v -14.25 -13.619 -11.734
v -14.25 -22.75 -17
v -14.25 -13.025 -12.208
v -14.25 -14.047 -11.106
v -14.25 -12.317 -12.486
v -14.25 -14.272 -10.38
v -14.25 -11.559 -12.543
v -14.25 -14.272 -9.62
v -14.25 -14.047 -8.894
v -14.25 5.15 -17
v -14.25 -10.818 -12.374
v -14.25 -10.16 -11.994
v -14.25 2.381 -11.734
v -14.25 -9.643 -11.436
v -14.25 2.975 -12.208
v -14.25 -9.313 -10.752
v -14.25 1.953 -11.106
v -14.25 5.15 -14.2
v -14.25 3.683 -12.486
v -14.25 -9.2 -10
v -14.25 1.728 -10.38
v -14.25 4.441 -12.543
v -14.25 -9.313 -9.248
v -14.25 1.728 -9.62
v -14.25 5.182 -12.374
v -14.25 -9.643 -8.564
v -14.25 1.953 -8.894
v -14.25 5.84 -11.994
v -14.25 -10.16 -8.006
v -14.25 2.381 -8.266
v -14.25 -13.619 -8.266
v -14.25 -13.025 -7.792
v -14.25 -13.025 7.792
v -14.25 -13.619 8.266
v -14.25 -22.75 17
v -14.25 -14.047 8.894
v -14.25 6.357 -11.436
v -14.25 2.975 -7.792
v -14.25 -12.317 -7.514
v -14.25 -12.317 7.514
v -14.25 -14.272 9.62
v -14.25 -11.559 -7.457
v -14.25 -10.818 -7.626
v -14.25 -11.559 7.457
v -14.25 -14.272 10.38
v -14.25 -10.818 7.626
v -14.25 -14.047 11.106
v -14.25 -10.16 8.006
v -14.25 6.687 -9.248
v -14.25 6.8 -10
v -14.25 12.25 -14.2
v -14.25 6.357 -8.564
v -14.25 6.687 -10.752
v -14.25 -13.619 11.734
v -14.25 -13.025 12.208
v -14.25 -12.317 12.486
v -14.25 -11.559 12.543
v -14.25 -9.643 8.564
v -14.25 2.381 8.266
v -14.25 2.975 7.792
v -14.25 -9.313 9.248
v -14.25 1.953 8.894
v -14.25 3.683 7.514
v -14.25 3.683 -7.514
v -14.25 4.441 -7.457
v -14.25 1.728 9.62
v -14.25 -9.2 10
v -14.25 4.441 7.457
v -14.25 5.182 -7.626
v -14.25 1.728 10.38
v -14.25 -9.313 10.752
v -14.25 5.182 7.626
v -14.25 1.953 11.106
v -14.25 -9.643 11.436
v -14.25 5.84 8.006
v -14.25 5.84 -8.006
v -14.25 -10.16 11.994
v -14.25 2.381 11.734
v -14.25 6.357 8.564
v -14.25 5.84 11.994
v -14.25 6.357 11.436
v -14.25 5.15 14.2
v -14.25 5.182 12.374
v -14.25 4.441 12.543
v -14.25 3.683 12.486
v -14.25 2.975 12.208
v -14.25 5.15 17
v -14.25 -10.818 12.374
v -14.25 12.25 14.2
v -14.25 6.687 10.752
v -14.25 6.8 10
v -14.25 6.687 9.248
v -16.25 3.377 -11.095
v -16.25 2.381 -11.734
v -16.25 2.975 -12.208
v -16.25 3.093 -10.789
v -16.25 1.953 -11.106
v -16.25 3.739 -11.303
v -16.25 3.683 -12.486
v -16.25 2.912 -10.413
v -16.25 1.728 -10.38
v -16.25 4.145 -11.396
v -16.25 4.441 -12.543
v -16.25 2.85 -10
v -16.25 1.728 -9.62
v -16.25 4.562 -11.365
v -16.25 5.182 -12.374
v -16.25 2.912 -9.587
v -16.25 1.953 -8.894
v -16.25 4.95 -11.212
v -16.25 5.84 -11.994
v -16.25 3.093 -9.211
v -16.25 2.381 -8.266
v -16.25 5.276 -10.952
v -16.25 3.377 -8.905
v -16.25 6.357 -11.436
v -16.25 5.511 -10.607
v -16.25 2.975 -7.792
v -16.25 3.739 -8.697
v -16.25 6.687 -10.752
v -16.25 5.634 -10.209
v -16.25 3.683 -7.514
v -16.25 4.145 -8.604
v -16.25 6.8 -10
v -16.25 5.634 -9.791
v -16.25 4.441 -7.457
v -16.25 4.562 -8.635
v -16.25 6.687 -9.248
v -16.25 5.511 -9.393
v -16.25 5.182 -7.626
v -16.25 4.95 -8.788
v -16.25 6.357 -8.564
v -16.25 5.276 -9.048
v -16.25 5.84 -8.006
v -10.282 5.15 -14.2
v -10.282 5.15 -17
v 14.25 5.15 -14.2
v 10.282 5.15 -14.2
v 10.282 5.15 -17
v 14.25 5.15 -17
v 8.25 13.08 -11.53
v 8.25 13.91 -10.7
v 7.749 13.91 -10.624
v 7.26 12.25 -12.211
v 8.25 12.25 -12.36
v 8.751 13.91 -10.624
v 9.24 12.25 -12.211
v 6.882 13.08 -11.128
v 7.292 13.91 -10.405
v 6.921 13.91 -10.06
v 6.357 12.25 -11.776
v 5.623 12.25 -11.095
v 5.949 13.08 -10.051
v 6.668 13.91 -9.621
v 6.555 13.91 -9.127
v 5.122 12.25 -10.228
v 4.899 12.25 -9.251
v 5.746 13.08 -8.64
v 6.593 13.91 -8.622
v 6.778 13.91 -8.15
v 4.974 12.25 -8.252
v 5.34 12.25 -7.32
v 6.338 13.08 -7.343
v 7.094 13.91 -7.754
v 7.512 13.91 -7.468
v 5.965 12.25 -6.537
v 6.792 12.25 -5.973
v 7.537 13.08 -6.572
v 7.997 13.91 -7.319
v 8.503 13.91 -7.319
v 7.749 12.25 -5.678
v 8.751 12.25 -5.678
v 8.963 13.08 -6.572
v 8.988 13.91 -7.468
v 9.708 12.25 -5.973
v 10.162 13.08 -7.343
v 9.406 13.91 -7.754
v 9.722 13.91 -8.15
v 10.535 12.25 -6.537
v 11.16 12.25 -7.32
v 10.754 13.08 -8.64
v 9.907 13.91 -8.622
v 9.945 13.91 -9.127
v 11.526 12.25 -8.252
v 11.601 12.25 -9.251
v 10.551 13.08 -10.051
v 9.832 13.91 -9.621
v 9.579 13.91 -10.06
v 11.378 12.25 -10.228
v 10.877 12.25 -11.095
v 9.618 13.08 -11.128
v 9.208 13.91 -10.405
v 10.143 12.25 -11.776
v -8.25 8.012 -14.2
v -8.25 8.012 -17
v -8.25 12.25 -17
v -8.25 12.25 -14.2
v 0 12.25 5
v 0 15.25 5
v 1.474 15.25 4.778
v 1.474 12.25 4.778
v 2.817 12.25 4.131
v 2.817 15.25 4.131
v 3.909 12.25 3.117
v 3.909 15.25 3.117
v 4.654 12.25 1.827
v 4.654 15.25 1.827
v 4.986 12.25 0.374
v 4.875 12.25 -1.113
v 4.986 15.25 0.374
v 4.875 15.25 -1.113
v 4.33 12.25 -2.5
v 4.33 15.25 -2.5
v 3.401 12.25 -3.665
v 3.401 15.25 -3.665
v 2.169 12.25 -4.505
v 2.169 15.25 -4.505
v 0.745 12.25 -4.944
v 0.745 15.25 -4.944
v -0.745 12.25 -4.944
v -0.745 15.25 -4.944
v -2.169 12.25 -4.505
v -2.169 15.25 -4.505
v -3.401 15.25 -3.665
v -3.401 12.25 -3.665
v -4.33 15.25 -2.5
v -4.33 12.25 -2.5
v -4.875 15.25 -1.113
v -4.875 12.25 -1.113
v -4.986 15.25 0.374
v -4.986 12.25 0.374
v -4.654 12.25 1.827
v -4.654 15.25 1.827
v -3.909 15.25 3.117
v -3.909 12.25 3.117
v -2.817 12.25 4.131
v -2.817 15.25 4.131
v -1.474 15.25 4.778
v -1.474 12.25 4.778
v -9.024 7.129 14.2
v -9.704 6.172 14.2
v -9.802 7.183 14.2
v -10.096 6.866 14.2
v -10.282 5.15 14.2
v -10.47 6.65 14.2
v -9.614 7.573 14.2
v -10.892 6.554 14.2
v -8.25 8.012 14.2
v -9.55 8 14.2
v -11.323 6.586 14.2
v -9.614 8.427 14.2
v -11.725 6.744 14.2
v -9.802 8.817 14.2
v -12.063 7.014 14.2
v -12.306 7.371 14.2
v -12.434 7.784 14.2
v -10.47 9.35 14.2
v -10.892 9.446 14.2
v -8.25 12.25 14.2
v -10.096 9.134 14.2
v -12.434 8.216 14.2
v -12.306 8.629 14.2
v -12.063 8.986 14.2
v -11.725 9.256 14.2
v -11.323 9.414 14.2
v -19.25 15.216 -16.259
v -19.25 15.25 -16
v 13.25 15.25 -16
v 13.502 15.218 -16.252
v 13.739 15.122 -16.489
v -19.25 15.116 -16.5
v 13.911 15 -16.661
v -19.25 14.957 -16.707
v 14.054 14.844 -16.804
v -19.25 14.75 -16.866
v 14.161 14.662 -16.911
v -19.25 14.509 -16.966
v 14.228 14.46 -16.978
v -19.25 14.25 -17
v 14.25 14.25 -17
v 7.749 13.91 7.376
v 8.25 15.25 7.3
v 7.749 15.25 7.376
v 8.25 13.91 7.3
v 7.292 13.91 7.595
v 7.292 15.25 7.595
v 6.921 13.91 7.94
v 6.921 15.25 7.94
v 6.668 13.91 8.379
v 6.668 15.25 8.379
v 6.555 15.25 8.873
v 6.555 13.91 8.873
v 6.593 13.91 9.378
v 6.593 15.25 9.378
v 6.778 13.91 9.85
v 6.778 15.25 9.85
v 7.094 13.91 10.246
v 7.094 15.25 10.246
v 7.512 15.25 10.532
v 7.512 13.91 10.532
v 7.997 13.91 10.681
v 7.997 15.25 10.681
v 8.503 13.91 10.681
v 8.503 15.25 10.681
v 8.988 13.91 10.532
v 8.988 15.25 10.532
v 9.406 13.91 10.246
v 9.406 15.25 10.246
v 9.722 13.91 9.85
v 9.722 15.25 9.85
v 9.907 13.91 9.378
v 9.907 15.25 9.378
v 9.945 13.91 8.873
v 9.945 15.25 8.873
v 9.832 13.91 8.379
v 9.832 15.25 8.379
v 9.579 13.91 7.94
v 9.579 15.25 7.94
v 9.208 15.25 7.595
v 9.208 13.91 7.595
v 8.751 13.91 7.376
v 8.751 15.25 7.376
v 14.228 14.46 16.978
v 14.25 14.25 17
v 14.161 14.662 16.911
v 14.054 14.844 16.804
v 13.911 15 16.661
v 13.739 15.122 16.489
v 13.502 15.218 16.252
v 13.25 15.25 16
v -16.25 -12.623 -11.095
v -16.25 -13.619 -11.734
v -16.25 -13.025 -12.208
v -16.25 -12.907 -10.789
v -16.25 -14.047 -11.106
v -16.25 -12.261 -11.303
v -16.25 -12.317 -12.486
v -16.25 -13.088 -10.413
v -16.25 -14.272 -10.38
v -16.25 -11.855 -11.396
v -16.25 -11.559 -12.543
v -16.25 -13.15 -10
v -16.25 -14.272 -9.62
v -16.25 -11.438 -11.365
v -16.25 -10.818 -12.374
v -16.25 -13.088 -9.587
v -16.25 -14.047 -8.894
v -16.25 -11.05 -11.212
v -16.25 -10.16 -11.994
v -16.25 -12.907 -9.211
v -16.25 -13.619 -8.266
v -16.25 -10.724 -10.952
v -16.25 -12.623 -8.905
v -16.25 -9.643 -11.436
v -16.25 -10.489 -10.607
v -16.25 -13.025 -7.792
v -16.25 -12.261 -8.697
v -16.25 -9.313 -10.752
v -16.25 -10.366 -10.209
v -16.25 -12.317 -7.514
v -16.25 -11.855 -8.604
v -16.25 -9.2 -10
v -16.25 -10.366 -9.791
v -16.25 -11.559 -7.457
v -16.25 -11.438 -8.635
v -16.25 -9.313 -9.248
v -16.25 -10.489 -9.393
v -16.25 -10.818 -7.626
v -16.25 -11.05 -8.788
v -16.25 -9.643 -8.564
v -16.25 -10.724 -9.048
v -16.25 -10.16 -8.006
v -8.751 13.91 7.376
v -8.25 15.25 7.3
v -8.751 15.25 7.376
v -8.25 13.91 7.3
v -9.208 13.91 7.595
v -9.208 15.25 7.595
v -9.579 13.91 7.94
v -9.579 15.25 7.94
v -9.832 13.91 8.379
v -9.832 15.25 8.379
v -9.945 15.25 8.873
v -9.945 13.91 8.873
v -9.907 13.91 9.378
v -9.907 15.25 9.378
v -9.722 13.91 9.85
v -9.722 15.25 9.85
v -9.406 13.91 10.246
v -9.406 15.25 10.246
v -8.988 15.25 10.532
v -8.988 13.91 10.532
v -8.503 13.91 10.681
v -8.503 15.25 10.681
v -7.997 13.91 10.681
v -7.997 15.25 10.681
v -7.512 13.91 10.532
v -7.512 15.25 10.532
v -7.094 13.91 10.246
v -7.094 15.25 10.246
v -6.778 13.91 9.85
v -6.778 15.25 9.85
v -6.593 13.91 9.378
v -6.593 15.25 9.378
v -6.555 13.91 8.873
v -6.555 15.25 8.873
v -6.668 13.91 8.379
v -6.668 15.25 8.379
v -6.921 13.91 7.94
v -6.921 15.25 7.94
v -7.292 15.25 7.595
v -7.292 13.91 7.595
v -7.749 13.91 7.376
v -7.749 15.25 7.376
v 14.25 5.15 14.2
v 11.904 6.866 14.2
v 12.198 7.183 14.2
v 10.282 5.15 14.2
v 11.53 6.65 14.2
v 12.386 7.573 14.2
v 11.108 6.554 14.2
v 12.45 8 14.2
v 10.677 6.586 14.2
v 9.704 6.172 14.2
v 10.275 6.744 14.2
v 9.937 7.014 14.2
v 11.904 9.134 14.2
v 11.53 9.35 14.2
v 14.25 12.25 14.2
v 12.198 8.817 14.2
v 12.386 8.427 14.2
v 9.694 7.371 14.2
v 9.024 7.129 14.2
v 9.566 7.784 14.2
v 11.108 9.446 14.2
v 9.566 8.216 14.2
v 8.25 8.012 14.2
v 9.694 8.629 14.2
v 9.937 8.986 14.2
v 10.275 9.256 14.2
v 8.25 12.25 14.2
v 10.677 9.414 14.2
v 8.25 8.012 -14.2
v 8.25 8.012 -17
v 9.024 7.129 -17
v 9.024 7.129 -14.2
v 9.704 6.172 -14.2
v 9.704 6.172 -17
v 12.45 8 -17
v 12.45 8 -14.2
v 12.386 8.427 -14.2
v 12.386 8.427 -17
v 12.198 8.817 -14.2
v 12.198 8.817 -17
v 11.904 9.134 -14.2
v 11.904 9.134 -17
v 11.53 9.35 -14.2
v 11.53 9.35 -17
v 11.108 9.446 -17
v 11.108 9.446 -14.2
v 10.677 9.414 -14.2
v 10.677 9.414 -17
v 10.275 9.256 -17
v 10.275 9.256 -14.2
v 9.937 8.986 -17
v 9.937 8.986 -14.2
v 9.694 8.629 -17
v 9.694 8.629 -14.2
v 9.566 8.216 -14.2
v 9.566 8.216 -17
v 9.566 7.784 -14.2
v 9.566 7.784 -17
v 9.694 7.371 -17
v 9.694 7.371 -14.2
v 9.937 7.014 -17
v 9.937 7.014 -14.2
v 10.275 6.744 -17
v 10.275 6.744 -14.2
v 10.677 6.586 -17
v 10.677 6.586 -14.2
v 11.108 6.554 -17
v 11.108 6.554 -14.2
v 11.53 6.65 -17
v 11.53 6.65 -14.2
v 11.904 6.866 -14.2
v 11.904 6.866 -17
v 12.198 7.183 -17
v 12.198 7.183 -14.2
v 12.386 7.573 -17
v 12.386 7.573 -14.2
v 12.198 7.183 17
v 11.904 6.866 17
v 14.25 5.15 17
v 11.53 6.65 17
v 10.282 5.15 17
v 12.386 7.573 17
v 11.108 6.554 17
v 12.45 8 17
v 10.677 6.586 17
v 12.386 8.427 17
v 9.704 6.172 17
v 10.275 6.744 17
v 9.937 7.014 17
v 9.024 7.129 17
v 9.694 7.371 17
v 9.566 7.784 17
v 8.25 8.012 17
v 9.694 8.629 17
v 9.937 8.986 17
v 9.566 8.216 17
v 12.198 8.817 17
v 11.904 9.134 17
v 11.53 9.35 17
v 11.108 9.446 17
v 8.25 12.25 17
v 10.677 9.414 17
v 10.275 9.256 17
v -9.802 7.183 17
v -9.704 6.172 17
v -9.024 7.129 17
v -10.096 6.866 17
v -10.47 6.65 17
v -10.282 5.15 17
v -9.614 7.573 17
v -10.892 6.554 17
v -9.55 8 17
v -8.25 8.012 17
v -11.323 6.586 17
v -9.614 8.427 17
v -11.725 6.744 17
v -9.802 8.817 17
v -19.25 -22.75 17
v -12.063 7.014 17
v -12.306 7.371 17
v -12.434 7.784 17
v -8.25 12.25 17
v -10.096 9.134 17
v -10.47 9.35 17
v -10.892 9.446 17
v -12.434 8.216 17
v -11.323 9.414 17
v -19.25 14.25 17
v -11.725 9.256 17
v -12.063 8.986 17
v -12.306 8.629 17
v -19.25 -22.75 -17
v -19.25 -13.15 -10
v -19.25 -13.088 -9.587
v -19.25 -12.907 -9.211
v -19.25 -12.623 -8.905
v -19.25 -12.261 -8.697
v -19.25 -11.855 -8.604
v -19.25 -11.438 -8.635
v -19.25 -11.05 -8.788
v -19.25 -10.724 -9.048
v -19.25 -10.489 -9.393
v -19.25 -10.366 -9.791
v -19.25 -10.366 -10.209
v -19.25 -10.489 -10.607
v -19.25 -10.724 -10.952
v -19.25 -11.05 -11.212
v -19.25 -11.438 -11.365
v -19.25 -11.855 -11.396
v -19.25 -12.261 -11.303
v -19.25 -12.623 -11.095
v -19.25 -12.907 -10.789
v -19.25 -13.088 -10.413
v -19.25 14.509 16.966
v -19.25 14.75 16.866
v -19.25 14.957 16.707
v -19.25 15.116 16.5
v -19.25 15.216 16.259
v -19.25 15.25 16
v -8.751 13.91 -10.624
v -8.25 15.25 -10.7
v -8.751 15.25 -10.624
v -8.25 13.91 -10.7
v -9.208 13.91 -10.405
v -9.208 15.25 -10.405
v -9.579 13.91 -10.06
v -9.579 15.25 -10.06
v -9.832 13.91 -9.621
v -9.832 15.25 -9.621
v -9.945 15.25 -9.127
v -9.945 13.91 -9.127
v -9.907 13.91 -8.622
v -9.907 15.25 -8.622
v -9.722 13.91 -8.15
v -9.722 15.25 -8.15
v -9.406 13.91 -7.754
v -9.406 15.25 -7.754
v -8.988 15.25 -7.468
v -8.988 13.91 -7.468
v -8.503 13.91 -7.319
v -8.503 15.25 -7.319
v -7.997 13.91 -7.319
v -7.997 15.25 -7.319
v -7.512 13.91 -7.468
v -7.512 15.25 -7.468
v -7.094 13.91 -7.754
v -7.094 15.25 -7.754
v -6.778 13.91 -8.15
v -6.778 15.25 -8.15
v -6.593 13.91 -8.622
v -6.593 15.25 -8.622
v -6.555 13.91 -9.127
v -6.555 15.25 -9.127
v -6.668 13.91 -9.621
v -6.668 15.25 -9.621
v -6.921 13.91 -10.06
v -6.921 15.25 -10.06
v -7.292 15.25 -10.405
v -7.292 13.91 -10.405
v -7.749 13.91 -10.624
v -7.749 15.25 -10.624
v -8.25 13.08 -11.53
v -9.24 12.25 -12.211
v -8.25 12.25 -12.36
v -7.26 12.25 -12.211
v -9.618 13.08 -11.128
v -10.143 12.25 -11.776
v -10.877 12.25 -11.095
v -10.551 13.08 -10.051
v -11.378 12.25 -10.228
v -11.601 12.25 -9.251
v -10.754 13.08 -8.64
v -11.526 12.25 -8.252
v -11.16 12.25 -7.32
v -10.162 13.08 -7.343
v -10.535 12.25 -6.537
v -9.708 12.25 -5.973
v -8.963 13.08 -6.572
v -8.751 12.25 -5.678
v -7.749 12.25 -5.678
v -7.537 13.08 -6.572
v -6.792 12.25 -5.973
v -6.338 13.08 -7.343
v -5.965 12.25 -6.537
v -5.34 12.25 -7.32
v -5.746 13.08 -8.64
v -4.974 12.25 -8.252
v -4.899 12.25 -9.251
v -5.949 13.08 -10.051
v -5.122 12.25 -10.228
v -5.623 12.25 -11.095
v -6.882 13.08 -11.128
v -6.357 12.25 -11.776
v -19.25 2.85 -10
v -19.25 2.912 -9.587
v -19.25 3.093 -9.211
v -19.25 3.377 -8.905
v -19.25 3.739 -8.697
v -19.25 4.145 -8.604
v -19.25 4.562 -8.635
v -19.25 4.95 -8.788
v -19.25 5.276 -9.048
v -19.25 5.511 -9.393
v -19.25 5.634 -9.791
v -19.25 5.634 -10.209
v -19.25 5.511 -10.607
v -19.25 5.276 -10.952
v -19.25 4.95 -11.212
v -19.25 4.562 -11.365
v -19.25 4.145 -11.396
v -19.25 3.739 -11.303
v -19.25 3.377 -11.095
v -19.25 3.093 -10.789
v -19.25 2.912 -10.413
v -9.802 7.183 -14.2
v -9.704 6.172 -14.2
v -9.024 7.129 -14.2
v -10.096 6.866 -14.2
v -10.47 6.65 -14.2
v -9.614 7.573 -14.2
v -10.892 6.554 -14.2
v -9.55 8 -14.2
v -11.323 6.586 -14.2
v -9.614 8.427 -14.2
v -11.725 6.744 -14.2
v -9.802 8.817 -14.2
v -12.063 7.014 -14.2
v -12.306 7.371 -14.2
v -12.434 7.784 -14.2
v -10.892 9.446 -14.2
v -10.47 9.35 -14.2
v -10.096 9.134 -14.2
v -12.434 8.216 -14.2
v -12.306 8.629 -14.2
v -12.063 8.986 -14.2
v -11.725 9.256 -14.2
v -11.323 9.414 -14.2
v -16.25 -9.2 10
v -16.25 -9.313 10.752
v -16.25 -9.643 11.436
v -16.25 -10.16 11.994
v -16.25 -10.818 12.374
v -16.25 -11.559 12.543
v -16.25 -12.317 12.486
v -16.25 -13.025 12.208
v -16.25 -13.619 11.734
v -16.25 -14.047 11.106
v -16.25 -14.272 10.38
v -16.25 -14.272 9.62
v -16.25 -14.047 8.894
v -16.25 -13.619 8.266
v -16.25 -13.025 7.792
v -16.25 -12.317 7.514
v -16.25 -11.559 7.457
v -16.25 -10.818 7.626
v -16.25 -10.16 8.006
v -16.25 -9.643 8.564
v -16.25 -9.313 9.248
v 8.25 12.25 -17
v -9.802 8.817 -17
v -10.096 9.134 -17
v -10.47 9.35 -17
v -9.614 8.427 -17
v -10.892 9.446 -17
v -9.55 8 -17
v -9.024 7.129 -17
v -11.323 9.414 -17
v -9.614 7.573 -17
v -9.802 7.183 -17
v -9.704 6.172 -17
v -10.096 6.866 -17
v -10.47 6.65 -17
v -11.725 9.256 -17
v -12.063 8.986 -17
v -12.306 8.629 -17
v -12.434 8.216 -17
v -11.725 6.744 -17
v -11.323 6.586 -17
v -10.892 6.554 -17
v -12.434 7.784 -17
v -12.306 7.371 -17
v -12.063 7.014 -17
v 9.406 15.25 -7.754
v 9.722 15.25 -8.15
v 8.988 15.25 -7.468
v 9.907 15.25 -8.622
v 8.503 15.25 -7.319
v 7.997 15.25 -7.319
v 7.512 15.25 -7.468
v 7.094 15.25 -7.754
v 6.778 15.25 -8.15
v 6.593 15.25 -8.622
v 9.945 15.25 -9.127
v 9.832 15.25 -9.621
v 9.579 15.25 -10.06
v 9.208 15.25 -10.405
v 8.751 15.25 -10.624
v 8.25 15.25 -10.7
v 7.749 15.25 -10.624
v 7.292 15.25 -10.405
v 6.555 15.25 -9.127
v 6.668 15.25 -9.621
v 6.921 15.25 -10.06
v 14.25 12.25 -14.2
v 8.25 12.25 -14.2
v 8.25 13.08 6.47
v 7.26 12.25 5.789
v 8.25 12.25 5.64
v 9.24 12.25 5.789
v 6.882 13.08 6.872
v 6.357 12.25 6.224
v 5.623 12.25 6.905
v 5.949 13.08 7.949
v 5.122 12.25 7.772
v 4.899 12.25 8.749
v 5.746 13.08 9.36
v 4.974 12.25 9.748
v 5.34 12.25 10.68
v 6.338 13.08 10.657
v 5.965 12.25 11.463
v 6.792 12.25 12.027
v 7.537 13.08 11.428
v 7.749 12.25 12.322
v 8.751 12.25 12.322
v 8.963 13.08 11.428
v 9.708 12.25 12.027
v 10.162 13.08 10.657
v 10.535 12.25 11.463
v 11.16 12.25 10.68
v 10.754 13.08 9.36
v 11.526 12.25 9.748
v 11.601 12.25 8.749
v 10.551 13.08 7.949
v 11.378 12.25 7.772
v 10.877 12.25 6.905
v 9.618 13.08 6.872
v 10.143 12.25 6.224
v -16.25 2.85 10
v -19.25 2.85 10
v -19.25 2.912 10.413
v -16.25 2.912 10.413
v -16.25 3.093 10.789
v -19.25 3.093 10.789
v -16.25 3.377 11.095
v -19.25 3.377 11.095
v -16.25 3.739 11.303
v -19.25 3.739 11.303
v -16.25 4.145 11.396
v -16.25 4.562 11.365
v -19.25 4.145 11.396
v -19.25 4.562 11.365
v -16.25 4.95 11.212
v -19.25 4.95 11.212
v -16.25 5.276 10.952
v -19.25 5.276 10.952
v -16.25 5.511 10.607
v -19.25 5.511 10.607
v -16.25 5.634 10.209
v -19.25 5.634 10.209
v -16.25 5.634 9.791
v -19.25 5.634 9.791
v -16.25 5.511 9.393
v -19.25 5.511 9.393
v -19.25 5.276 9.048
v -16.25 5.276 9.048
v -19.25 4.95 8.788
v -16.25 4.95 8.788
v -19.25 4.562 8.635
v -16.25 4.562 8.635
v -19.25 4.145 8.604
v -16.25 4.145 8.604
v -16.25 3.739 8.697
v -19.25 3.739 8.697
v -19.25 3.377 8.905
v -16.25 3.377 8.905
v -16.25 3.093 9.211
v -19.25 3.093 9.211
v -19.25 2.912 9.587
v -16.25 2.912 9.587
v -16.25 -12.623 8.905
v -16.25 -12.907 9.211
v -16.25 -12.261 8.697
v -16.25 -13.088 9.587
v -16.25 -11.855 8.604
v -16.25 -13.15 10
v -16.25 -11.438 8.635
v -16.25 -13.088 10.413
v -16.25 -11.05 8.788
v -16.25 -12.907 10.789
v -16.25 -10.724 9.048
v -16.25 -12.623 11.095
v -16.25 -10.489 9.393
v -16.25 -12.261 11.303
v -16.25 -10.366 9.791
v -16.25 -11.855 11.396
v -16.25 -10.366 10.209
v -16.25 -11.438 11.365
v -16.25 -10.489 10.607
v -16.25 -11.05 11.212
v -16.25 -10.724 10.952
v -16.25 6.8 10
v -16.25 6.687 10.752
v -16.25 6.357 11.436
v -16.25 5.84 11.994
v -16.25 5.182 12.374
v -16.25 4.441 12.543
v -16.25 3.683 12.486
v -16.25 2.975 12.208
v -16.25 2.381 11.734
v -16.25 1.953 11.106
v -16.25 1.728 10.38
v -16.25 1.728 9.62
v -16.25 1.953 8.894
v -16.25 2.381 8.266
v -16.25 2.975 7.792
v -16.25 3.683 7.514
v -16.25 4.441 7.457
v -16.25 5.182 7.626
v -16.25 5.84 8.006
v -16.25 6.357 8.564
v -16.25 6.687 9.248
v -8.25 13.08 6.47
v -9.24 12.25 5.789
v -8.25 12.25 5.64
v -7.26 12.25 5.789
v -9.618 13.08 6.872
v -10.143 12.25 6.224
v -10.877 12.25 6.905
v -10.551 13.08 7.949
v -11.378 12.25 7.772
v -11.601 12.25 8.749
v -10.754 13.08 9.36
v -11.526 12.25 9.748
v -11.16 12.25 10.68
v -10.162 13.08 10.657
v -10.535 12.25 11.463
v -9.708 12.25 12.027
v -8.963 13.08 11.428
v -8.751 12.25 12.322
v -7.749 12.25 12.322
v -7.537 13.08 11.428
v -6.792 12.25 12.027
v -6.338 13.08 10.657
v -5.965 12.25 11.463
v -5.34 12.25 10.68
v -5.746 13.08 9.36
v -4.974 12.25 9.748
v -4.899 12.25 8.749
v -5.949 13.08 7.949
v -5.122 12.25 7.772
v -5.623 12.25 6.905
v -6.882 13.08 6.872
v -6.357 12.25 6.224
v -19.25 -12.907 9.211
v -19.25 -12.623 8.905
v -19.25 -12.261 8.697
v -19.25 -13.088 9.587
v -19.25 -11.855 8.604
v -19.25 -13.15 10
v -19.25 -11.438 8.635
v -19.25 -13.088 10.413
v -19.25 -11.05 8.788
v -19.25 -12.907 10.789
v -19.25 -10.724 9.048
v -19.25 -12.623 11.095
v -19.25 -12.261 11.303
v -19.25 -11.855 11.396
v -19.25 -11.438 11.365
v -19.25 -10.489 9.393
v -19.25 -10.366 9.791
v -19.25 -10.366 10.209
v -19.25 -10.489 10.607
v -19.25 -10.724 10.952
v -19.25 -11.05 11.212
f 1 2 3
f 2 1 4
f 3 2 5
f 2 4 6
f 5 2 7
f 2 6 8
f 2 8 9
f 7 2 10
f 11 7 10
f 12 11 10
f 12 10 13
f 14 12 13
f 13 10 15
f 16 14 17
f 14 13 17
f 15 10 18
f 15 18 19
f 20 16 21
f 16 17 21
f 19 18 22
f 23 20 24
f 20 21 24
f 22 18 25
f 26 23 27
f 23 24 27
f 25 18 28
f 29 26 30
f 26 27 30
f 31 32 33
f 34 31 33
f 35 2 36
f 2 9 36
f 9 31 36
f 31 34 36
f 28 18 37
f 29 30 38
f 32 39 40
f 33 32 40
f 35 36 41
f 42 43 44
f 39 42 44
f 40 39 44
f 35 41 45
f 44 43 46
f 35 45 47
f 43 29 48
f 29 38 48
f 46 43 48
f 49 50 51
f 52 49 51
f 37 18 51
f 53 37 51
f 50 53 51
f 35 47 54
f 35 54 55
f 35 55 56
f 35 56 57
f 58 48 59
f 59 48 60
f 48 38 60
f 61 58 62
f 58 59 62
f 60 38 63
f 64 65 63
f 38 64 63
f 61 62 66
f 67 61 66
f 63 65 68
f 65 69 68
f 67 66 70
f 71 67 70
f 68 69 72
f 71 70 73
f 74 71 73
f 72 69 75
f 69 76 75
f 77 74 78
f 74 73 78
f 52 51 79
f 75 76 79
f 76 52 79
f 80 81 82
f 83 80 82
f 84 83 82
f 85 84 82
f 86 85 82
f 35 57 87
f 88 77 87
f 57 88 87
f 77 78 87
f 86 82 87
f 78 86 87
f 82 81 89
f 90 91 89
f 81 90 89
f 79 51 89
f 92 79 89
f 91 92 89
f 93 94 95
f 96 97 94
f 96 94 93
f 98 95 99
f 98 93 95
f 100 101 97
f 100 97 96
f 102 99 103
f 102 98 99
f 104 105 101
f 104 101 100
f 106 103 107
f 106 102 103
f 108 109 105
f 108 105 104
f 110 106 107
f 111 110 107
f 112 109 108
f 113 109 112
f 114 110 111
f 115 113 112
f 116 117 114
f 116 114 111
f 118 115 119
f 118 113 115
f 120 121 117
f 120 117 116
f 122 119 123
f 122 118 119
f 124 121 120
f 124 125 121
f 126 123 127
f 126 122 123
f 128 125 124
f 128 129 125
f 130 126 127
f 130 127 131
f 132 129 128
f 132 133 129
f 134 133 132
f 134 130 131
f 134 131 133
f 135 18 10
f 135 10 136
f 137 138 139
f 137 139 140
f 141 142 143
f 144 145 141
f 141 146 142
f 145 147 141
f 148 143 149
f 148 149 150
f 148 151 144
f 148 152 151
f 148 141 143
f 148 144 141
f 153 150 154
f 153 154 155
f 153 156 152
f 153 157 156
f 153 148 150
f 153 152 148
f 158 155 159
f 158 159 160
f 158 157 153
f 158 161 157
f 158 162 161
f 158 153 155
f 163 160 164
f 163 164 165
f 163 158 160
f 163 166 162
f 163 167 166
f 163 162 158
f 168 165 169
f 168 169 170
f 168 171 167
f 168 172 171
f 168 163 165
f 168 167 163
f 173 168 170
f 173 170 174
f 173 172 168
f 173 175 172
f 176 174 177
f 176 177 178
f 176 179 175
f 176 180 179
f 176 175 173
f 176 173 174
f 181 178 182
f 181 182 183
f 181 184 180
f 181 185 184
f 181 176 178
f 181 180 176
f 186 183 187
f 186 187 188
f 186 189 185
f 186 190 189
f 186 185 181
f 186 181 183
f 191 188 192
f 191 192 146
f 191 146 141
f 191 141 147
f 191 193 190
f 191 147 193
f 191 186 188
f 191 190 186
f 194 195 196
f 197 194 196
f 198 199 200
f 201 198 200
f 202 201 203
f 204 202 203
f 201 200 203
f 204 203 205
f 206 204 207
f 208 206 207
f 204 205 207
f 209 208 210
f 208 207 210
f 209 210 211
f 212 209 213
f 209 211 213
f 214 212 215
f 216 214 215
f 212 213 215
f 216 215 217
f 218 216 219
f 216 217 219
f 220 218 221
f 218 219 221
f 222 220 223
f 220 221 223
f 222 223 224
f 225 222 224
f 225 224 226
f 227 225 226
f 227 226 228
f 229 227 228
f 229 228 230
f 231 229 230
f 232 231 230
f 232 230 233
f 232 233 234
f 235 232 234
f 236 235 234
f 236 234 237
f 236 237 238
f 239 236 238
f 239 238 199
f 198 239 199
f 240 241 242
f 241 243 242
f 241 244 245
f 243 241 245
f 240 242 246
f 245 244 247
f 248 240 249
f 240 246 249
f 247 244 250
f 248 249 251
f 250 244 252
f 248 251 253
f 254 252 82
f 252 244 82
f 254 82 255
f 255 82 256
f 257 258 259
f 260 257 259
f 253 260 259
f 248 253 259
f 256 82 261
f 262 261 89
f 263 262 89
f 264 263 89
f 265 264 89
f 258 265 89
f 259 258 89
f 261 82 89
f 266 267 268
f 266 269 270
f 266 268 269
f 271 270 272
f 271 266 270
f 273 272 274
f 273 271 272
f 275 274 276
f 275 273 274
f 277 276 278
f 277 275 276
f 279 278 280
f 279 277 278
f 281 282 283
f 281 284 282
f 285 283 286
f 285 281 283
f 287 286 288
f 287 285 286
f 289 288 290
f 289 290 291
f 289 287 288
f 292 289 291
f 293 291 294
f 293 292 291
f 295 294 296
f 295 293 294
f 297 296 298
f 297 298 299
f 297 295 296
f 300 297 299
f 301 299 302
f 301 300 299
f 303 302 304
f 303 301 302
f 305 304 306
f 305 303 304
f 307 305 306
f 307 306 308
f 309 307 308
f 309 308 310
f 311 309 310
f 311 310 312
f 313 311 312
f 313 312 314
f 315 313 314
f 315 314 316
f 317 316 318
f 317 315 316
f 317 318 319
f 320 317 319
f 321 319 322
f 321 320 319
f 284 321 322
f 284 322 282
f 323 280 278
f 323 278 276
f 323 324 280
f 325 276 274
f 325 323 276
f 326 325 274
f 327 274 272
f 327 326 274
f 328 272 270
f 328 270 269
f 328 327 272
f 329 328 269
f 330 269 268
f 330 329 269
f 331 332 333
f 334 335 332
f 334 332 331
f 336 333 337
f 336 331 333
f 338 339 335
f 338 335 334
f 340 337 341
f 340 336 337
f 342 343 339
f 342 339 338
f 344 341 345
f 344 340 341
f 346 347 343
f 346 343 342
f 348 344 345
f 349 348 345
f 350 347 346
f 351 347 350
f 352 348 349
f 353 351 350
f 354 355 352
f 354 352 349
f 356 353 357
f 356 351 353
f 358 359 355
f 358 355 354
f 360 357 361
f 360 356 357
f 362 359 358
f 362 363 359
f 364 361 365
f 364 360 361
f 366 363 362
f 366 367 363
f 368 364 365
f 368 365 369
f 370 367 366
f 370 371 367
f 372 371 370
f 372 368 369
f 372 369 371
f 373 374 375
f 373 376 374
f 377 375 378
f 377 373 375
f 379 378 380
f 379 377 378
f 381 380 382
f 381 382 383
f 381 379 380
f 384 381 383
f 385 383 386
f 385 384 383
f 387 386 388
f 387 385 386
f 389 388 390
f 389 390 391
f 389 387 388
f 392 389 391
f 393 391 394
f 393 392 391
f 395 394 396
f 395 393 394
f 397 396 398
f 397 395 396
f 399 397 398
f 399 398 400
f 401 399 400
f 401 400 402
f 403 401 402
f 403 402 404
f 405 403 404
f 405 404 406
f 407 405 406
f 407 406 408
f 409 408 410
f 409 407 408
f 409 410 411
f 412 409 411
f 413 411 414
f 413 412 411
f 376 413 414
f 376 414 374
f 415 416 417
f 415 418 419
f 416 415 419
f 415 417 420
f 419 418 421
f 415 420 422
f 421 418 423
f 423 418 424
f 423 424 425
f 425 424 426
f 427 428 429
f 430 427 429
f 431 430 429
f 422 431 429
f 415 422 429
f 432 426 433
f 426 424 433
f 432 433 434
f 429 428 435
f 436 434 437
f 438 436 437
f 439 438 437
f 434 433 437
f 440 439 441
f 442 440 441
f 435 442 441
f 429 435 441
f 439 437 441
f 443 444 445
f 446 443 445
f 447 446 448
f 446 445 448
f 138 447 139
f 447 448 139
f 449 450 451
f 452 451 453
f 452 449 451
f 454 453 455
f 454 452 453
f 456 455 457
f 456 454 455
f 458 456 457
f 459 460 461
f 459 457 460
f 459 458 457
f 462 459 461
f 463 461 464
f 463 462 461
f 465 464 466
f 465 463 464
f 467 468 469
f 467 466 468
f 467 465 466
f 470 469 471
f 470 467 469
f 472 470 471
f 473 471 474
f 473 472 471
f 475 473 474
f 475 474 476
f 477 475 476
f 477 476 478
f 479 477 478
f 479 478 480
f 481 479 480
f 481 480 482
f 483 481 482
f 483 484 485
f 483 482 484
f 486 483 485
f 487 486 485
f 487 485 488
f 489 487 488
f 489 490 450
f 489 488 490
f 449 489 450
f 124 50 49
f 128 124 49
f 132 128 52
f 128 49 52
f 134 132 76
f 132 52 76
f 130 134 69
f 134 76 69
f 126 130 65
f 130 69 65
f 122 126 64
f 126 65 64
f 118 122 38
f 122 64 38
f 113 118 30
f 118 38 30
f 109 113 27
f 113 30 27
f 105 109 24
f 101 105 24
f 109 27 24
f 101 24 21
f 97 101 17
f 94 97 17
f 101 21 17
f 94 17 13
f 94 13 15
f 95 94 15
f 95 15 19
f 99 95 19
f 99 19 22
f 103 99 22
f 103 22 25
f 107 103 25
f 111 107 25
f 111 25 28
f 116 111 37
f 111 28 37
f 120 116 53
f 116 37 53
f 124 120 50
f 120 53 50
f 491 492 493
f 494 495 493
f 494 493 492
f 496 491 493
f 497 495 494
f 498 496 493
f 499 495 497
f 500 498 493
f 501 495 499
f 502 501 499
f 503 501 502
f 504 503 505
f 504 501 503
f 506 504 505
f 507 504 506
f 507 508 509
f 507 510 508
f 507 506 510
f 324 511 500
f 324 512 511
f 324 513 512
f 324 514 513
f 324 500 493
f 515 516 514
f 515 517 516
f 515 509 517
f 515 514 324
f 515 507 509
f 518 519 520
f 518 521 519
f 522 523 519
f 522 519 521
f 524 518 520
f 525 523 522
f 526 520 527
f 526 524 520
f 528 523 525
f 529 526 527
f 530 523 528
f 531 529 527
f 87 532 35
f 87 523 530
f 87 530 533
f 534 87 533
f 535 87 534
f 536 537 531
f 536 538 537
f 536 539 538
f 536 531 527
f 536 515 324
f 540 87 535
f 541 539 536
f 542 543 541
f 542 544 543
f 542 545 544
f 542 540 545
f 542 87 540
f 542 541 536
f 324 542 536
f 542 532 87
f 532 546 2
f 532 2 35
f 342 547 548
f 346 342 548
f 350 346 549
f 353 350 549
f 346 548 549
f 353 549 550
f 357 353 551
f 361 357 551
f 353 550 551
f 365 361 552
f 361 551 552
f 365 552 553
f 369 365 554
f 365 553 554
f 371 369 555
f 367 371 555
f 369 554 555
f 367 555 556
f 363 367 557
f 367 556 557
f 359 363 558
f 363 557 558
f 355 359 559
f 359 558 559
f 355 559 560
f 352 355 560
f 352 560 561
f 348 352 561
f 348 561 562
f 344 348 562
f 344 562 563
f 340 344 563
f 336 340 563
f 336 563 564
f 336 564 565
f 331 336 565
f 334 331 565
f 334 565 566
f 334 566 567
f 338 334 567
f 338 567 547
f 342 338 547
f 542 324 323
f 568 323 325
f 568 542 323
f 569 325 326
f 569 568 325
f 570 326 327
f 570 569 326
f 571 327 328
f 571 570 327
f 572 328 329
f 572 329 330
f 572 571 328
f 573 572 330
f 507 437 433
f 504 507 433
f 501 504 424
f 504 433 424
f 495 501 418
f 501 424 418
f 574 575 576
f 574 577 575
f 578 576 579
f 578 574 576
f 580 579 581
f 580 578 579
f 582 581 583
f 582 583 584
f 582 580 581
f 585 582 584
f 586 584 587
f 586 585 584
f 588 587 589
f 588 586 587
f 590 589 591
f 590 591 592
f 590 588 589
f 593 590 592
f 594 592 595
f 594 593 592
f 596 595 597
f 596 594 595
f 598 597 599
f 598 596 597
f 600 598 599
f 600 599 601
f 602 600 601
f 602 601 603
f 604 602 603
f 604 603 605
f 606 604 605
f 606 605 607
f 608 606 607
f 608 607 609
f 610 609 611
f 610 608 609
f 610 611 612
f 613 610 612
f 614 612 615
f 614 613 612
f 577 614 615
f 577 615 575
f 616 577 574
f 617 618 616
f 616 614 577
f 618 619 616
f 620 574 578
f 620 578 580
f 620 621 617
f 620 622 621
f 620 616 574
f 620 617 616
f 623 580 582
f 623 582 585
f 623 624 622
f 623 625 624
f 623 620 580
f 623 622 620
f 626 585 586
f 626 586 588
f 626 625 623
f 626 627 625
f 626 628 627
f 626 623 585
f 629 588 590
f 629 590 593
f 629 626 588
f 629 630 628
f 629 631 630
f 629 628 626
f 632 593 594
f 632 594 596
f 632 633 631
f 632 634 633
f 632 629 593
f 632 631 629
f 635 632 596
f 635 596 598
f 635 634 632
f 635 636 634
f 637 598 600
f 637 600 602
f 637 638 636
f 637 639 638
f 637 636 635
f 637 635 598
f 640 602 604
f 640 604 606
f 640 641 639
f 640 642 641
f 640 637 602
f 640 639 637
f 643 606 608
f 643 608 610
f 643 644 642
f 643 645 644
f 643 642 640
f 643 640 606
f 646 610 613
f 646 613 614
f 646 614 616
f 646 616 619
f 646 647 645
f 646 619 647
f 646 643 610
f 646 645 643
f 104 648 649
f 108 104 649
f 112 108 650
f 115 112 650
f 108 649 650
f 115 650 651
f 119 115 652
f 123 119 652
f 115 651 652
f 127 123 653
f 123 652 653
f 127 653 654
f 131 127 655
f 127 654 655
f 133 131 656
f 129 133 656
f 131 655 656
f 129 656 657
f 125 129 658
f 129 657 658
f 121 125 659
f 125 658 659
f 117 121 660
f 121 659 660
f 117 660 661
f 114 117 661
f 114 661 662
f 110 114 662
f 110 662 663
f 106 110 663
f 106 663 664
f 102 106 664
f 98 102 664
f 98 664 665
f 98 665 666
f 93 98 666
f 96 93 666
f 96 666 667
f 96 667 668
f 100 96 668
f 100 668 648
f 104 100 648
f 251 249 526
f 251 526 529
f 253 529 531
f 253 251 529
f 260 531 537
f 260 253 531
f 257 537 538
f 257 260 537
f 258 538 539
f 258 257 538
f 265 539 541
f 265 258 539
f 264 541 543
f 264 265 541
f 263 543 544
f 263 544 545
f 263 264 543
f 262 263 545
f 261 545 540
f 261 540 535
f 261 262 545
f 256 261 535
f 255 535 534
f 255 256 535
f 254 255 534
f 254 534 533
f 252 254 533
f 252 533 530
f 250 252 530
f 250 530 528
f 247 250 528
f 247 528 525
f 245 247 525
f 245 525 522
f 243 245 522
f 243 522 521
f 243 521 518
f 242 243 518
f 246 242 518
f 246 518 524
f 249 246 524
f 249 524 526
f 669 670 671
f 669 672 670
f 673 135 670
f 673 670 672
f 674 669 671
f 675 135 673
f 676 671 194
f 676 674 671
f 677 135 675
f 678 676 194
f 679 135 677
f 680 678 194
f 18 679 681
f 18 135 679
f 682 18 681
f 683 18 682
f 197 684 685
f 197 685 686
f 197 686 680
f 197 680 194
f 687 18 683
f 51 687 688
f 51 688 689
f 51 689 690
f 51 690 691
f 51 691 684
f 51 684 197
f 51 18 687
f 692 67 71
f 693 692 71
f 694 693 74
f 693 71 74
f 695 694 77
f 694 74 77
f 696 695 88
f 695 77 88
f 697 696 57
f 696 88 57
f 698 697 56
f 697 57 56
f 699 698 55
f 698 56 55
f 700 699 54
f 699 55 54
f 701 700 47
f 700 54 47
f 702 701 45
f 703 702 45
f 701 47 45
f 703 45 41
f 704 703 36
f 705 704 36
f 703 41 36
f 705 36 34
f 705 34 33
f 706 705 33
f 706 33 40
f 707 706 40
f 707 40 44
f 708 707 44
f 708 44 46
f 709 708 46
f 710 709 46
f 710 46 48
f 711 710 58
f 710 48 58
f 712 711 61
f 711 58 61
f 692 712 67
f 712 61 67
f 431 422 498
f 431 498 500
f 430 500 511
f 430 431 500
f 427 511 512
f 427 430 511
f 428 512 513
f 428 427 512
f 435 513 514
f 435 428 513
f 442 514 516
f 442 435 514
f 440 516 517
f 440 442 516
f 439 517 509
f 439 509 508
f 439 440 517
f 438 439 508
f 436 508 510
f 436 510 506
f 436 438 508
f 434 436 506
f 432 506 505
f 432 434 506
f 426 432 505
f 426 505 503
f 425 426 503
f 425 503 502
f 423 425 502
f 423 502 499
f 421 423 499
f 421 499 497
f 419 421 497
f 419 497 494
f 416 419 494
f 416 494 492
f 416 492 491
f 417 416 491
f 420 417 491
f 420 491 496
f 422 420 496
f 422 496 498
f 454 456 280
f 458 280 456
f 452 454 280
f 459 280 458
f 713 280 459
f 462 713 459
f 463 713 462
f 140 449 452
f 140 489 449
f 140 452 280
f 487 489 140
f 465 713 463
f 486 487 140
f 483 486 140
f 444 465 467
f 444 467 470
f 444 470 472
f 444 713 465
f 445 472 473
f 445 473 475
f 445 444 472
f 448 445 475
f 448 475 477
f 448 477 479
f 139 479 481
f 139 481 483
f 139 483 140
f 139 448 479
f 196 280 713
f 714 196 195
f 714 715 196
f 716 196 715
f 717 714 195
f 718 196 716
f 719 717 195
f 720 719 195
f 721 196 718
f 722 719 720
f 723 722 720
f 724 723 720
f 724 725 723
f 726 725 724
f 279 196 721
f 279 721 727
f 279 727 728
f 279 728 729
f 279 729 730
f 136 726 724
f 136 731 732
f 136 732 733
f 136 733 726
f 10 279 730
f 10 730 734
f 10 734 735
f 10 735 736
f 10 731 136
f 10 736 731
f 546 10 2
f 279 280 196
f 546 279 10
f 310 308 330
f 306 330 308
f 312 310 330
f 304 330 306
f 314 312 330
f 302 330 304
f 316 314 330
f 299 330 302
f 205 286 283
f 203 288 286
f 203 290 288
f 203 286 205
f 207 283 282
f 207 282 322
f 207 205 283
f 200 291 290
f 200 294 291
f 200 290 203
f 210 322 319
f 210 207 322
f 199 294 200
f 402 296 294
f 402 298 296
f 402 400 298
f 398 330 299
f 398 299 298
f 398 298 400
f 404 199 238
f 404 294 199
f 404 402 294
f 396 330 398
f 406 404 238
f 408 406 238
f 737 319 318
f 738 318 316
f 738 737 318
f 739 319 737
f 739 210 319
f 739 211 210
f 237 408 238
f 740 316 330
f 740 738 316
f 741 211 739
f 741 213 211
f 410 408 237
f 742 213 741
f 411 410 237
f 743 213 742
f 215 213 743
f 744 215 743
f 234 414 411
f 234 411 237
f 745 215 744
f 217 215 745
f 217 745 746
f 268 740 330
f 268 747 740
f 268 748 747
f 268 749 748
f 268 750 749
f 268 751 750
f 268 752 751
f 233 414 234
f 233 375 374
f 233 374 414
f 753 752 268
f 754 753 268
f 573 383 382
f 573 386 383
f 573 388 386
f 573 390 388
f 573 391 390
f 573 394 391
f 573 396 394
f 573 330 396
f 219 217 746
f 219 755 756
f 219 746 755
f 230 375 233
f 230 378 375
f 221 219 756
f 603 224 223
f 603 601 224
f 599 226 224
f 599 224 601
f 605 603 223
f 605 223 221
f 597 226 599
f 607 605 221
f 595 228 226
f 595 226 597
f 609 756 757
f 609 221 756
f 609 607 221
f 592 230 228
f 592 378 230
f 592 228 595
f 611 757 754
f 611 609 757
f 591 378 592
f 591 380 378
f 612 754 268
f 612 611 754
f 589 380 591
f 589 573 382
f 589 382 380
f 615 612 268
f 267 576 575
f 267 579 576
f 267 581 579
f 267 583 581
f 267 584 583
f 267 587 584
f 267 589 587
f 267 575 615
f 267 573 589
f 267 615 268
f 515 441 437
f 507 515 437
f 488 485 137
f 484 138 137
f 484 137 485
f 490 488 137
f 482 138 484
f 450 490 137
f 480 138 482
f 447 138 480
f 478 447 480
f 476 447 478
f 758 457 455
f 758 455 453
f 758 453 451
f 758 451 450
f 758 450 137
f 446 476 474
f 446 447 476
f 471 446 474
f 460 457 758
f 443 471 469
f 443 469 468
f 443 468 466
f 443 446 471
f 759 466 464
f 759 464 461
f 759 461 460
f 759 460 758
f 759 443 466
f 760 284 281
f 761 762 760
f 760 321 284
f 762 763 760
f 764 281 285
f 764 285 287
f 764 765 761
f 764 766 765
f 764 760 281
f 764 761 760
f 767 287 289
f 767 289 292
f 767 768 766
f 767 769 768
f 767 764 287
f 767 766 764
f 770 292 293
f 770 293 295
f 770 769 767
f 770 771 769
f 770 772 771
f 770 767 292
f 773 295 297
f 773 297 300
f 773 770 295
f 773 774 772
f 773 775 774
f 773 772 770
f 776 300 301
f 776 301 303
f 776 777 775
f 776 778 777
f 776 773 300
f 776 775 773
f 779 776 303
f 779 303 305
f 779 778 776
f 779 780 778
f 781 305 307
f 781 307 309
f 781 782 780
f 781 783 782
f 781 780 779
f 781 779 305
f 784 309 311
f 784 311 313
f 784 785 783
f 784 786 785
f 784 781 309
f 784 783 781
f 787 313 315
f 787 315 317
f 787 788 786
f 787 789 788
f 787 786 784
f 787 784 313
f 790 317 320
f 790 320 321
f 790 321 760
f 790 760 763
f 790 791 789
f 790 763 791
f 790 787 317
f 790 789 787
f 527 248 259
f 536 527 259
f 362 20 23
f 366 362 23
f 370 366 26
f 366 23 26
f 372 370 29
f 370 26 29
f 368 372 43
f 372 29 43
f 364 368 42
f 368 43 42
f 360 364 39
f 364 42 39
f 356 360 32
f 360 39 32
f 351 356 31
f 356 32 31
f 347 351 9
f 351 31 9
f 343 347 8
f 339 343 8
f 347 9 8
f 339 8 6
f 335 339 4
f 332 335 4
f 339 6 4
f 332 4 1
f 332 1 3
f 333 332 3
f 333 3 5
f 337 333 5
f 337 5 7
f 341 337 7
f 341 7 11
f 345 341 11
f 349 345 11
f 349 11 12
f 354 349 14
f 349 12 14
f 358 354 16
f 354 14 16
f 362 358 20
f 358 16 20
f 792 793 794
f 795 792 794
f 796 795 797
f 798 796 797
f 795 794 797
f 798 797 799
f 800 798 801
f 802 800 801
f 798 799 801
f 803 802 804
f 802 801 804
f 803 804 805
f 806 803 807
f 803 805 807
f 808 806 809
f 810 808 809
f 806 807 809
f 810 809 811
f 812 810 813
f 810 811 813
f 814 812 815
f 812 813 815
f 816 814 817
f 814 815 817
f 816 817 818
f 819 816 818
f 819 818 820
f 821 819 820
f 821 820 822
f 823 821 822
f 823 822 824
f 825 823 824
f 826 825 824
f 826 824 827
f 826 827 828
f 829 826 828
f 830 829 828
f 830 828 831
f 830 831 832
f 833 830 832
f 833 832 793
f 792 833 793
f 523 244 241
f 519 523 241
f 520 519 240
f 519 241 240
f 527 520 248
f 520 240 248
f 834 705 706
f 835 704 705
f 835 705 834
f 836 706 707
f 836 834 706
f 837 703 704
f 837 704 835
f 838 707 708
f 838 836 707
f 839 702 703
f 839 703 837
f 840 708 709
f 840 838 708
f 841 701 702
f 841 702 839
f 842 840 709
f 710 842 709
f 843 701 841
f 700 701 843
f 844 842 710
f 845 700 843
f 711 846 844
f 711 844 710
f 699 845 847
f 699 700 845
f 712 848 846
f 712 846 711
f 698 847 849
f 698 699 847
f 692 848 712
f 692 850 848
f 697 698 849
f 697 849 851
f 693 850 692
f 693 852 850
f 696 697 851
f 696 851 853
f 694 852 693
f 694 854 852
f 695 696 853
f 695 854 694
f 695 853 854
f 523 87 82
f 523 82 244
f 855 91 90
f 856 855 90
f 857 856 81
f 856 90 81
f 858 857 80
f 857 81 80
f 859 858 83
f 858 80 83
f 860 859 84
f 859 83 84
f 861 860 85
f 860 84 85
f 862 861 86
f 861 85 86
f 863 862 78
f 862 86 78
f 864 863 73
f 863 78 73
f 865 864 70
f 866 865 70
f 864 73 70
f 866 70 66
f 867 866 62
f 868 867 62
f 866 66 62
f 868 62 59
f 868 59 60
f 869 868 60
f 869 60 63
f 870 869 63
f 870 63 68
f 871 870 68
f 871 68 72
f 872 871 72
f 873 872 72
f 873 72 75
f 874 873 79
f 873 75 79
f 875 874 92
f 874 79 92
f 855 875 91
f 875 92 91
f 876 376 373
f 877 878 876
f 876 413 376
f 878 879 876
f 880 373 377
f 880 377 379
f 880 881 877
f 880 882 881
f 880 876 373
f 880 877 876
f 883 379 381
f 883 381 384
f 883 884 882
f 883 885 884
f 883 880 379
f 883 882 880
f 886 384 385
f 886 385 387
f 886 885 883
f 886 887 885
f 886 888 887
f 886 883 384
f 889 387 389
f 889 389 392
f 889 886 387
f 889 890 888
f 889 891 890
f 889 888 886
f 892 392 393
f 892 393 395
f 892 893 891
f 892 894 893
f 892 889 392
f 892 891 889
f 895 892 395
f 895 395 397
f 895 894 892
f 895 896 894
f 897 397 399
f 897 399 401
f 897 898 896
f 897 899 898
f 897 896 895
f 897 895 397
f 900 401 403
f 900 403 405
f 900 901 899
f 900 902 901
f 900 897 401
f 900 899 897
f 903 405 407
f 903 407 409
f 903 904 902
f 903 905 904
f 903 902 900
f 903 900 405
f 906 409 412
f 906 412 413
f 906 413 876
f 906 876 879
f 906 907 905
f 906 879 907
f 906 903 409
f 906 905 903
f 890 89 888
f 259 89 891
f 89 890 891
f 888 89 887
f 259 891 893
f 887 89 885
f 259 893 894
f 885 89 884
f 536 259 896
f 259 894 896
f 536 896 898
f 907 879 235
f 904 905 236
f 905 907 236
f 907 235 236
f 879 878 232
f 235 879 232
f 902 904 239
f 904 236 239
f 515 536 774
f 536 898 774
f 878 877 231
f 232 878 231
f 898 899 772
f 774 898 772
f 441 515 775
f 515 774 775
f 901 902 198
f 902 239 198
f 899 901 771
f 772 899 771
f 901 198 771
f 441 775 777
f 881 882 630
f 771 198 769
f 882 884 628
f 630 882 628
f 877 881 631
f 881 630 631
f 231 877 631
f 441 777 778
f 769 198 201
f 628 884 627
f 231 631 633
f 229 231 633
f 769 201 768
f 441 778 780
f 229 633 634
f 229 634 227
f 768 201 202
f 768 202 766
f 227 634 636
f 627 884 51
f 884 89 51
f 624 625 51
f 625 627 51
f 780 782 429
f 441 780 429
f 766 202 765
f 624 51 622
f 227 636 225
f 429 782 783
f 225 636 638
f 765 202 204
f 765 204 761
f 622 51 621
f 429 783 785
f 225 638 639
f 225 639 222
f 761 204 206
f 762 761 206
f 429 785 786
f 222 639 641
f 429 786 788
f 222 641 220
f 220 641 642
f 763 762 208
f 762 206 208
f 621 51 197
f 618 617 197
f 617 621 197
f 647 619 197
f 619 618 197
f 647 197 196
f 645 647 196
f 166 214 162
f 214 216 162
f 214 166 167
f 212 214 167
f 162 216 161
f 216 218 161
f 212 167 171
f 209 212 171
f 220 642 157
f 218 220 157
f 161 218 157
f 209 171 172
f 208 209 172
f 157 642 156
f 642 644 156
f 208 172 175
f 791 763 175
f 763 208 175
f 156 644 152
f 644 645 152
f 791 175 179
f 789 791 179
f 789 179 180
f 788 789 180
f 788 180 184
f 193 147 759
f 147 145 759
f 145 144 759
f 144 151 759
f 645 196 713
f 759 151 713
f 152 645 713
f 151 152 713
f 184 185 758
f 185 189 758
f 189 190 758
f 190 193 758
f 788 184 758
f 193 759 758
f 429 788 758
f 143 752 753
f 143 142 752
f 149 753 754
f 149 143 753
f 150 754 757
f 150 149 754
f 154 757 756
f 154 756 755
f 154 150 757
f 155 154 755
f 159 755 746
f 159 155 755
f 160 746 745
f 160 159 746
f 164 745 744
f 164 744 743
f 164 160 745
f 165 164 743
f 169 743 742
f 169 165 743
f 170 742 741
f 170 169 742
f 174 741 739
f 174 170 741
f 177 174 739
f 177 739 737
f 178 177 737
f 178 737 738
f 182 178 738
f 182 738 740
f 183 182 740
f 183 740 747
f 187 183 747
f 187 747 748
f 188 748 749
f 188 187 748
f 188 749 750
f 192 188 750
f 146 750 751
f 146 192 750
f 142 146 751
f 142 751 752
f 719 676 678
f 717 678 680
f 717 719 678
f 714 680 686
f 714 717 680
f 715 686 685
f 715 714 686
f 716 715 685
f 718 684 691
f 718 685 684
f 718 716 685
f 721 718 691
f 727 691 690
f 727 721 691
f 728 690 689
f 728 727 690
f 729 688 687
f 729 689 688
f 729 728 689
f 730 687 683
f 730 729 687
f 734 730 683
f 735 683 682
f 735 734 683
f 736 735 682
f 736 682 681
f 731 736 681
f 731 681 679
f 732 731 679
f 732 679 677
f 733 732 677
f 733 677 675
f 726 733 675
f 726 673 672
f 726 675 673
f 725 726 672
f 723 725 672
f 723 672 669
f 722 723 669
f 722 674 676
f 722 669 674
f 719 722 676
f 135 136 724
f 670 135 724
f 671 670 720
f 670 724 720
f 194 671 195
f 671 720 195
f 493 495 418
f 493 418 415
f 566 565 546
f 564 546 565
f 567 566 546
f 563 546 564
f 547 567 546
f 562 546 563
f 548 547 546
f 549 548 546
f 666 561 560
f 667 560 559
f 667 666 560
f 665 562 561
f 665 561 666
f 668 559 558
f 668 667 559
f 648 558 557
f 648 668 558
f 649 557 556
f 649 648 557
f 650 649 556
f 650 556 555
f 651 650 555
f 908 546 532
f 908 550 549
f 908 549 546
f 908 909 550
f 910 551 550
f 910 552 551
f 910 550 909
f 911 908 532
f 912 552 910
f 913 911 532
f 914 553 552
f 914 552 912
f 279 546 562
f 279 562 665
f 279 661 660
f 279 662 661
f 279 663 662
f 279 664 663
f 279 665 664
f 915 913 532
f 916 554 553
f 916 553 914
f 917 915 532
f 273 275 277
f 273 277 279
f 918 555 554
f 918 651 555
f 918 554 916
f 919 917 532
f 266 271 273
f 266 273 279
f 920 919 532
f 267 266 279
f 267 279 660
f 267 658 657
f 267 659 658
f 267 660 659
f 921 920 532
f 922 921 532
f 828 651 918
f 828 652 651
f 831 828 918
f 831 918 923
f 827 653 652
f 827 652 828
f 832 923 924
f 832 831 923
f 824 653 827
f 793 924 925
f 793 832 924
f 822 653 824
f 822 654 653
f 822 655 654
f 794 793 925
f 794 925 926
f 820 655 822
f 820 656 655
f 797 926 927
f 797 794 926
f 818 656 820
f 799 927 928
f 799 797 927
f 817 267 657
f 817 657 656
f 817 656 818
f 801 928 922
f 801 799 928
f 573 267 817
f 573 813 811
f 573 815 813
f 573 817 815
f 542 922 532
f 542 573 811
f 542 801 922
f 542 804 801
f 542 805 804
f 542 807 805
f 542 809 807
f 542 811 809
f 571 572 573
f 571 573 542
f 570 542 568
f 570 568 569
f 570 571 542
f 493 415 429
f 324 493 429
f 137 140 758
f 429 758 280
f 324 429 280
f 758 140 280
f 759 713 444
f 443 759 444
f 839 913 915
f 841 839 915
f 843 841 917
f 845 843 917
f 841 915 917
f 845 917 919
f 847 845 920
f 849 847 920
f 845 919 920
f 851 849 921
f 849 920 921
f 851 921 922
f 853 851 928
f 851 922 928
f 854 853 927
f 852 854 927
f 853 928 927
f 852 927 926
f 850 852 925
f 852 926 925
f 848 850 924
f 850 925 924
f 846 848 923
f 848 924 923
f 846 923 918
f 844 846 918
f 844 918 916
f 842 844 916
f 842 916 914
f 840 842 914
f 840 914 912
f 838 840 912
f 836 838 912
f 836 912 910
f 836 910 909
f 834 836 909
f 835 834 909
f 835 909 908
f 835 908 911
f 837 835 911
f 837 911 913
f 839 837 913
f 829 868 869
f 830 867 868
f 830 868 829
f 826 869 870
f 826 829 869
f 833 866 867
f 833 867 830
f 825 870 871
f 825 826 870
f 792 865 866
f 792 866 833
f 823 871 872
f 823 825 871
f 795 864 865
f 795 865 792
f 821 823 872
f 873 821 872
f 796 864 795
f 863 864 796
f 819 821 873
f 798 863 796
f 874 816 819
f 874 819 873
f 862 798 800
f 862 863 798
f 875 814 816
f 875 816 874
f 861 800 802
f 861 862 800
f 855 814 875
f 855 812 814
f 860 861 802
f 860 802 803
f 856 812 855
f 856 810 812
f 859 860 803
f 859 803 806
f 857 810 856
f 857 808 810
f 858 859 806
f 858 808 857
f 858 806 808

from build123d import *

# Parameters (mm, degrees)
BOSS_EXTRUDE7_DEPTH                          = 17
BOSS_EXTRUDE7_DEPTH_BACK                     = 17
SKETCH1_R                                    = 1.45
SKETCH34_W                                   = 28.4
SKETCH34_H                                   = 7.5
CUT_EXTRUDE11_DEPTH                          = 37.521397837
SKETCH35_R                                   = 5
CUT_EXTRUDE12_DEPTH                          = 25.542055741
CSK_FOR_M3_HEX_SOCKET_COUNTERSUNK_CA_2_COUNT = 2
CSK_FOR_M3_HEX_SOCKET_COUNTERSUNK_CA_2_PITCH = 16.5
CSK_FOR_M3_HEX_SOCKET_COUNTERSUNK_CA_3_COUNT = 2
CSK_FOR_M3_HEX_SOCKET_COUNTERSUNK_CA_3_PITCH = 18
CSK_FOR_M3_HEX_SOCKET_COUNTERSUNK_CA_4_COUNT = 2
CSK_FOR_M3_HEX_SOCKET_COUNTERSUNK_CA_4_PITCH = 24.418230894
FILLET5_R                                    = 1
SKETCH41_W                                   = 28.5
SKETCH41_H                                   = 0.4
CUT_EXTRUDE13_DEPTH                          = 40.895175147
BOSS_EXTRUDE8_START                          = 5
BOSS_EXTRUDE8_DEPTH                          = 5
SKETCH48_R                                   = 1.4
CUT_EXTRUDE14_DEPTH                          = 5
SKETCH49_R                                   = 2.55
CUT_EXTRUDE15_DEPTH                          = 2


with BuildPart() as part:
    # Sketch1 → Boss-Extrude7 (new, two sides: drawn at the far end of the back side and taken through both)
    with BuildSketch(Plane.XY.offset(-BOSS_EXTRUDE7_DEPTH_BACK)):
        with BuildLine():
            Line((-14.25, 15.25), (-14.25, 4.75))
            Line((-14.25, 4.75), (-10.473180033, 4.75))
            ThreePointArc((-10.473180033, 4.75), (-9.502581542, 6.476954843), (-8.25, 8.011710179))
            Line((-8.25, 8.011710179), (-8.25, 12.25))
            Line((-8.25, 12.25), (8.25, 12.25))
            Line((8.25, 12.25), (8.25, 8.011710179))
            ThreePointArc((8.25, 8.011710179), (9.502581542, 6.476954843), (10.473180033, 4.75))
            Line((10.473180033, 4.75), (14.25, 4.75))
            Line((14.25, 4.75), (14.25, 15.25))
            Line((14.25, 15.25), (-14.25, 15.25))
        make_face()
        with Locations((11, 8)):
            Circle(SKETCH1_R, mode=Mode.SUBTRACT)
        with Locations((-11, 8)):
            Circle(SKETCH1_R, mode=Mode.SUBTRACT)
    extrude(amount=BOSS_EXTRUDE7_DEPTH + BOSS_EXTRUDE7_DEPTH_BACK)

    # Sketch34 → Cut-Extrude11 (cut, through all)
    with BuildSketch(Plane.ZY.offset(14.25)):
        with Locations((0, 8.5)):
            Rectangle(SKETCH34_W, SKETCH34_H)
    extrude(amount=-CUT_EXTRUDE11_DEPTH, mode=Mode.SUBTRACT)

    # Sketch35 → Cut-Extrude12 (cut, through all)
    with BuildSketch(Plane(origin=(0, 15.25, 0), x_dir=(1, 0, 0), z_dir=(0, 1, 0))):
        Circle(SKETCH35_R)
    extrude(amount=-CUT_EXTRUDE12_DEPTH, mode=Mode.SUBTRACT)

    # Sketch40 → CSK for M3 Hex Socket Countersunk Cap Screw3 (revolve, cut)
    with BuildSketch(Plane(origin=(-8.25, 12.25, 9), x_dir=(0, 0, -1), z_dir=(1, 0, 0))):
        Polygon((0, 0), (0, 3), (1.7, 3), (1.7, 1.66), (3.36, 0), align=None)
    csk_for_m3_hex_socket_countersunk_cap_sc = revolve(axis=Axis((-8.25, 5.9, 9), (0, 1, 0)), mode=Mode.SUBTRACT)

    # CSK for M3 Hex Socket Countersunk Ca 2: CSK for M3 Hex Socket Countersunk Cap Screw3 ×2
    with Locations(*[(i * CSK_FOR_M3_HEX_SOCKET_COUNTERSUNK_CA_2_PITCH, 0, 0) for i in range(1, CSK_FOR_M3_HEX_SOCKET_COUNTERSUNK_CA_2_COUNT)]):
        add(csk_for_m3_hex_socket_countersunk_cap_sc, mode=Mode.SUBTRACT)

    # CSK for M3 Hex Socket Countersunk Ca 3: CSK for M3 Hex Socket Countersunk Cap Screw3 ×2
    with Locations(*[(0, 0, -i * CSK_FOR_M3_HEX_SOCKET_COUNTERSUNK_CA_3_PITCH) for i in range(1, CSK_FOR_M3_HEX_SOCKET_COUNTERSUNK_CA_3_COUNT)]):
        add(csk_for_m3_hex_socket_countersunk_cap_sc, mode=Mode.SUBTRACT)

    # CSK for M3 Hex Socket Countersunk Ca 4: CSK for M3 Hex Socket Countersunk Cap Screw3 ×2
    with Locations(*[Vector(0.6757246285173466, 0, -0.7371541402007413) * (i * CSK_FOR_M3_HEX_SOCKET_COUNTERSUNK_CA_4_PITCH) for i in range(1, CSK_FOR_M3_HEX_SOCKET_COUNTERSUNK_CA_4_COUNT)]):
        add(csk_for_m3_hex_socket_countersunk_cap_sc, mode=Mode.SUBTRACT)

    # Fillet5
    fillet5_edges = [part.edges().sort_by_distance(p)[0] for p in [
        (14.25, 15.25, 0),
        (0, 15.25, -17),
        (0, 15.25, 17),
    ]]
    fillet(fillet5_edges, radius=FILLET5_R)

    # Sketch41 → Cut-Extrude13 (cut, through all)
    with BuildSketch(Plane.XY.offset(17)):
        with Locations((0, 4.95)):
            Rectangle(SKETCH41_W, SKETCH41_H)
    extrude(amount=-CUT_EXTRUDE13_DEPTH, mode=Mode.SUBTRACT)

    # Sketch46 → Boss-Extrude8 (add)
    with BuildSketch(Plane.ZY.offset(14.25).offset(BOSS_EXTRUDE8_START)):
        with BuildLine():
            ThreePointArc((17, 14.25), (16.707106781, 14.957106781), (16, 15.25))
            Line((16, 15.25), (-16, 15.25))
            ThreePointArc((-16, 15.25), (-16.707106781, 14.957106781), (-17, 14.25))
            Line((-17, 14.25), (-17, -22.75))
            Line((-17, -22.75), (17, -22.75))
            Line((17, -22.75), (17, 14.25))
        make_face()
    extrude(amount=-BOSS_EXTRUDE8_DEPTH)

    # Sketch48 → Cut-Extrude14 (cut)
    with BuildSketch(Plane.ZY.offset(19.25)):
        with Locations((-10, -11.75)):
            Circle(SKETCH48_R)
        with Locations((10, -11.75)):
            Circle(SKETCH48_R)
        with Locations((10, 4.25)):
            Circle(SKETCH48_R)
        with Locations((-10, 4.25)):
            Circle(SKETCH48_R)
    extrude(amount=-CUT_EXTRUDE14_DEPTH, mode=Mode.SUBTRACT)

    # Sketch49 → Cut-Extrude15 (cut)
    with BuildSketch(Plane(origin=(-14.25, 0, 0), x_dir=(0, 0, -1), z_dir=(1, 0, 0))):
        with Locations((-10, -11.75)):
            Circle(SKETCH49_R)
        with Locations((10, -11.75)):
            Circle(SKETCH49_R)
        with Locations((10, 4.25)):
            Circle(SKETCH49_R)
        with Locations((-10, 4.25)):
            Circle(SKETCH49_R)
    extrude(amount=-CUT_EXTRUDE15_DEPTH, mode=Mode.SUBTRACT)


solid = part.part
